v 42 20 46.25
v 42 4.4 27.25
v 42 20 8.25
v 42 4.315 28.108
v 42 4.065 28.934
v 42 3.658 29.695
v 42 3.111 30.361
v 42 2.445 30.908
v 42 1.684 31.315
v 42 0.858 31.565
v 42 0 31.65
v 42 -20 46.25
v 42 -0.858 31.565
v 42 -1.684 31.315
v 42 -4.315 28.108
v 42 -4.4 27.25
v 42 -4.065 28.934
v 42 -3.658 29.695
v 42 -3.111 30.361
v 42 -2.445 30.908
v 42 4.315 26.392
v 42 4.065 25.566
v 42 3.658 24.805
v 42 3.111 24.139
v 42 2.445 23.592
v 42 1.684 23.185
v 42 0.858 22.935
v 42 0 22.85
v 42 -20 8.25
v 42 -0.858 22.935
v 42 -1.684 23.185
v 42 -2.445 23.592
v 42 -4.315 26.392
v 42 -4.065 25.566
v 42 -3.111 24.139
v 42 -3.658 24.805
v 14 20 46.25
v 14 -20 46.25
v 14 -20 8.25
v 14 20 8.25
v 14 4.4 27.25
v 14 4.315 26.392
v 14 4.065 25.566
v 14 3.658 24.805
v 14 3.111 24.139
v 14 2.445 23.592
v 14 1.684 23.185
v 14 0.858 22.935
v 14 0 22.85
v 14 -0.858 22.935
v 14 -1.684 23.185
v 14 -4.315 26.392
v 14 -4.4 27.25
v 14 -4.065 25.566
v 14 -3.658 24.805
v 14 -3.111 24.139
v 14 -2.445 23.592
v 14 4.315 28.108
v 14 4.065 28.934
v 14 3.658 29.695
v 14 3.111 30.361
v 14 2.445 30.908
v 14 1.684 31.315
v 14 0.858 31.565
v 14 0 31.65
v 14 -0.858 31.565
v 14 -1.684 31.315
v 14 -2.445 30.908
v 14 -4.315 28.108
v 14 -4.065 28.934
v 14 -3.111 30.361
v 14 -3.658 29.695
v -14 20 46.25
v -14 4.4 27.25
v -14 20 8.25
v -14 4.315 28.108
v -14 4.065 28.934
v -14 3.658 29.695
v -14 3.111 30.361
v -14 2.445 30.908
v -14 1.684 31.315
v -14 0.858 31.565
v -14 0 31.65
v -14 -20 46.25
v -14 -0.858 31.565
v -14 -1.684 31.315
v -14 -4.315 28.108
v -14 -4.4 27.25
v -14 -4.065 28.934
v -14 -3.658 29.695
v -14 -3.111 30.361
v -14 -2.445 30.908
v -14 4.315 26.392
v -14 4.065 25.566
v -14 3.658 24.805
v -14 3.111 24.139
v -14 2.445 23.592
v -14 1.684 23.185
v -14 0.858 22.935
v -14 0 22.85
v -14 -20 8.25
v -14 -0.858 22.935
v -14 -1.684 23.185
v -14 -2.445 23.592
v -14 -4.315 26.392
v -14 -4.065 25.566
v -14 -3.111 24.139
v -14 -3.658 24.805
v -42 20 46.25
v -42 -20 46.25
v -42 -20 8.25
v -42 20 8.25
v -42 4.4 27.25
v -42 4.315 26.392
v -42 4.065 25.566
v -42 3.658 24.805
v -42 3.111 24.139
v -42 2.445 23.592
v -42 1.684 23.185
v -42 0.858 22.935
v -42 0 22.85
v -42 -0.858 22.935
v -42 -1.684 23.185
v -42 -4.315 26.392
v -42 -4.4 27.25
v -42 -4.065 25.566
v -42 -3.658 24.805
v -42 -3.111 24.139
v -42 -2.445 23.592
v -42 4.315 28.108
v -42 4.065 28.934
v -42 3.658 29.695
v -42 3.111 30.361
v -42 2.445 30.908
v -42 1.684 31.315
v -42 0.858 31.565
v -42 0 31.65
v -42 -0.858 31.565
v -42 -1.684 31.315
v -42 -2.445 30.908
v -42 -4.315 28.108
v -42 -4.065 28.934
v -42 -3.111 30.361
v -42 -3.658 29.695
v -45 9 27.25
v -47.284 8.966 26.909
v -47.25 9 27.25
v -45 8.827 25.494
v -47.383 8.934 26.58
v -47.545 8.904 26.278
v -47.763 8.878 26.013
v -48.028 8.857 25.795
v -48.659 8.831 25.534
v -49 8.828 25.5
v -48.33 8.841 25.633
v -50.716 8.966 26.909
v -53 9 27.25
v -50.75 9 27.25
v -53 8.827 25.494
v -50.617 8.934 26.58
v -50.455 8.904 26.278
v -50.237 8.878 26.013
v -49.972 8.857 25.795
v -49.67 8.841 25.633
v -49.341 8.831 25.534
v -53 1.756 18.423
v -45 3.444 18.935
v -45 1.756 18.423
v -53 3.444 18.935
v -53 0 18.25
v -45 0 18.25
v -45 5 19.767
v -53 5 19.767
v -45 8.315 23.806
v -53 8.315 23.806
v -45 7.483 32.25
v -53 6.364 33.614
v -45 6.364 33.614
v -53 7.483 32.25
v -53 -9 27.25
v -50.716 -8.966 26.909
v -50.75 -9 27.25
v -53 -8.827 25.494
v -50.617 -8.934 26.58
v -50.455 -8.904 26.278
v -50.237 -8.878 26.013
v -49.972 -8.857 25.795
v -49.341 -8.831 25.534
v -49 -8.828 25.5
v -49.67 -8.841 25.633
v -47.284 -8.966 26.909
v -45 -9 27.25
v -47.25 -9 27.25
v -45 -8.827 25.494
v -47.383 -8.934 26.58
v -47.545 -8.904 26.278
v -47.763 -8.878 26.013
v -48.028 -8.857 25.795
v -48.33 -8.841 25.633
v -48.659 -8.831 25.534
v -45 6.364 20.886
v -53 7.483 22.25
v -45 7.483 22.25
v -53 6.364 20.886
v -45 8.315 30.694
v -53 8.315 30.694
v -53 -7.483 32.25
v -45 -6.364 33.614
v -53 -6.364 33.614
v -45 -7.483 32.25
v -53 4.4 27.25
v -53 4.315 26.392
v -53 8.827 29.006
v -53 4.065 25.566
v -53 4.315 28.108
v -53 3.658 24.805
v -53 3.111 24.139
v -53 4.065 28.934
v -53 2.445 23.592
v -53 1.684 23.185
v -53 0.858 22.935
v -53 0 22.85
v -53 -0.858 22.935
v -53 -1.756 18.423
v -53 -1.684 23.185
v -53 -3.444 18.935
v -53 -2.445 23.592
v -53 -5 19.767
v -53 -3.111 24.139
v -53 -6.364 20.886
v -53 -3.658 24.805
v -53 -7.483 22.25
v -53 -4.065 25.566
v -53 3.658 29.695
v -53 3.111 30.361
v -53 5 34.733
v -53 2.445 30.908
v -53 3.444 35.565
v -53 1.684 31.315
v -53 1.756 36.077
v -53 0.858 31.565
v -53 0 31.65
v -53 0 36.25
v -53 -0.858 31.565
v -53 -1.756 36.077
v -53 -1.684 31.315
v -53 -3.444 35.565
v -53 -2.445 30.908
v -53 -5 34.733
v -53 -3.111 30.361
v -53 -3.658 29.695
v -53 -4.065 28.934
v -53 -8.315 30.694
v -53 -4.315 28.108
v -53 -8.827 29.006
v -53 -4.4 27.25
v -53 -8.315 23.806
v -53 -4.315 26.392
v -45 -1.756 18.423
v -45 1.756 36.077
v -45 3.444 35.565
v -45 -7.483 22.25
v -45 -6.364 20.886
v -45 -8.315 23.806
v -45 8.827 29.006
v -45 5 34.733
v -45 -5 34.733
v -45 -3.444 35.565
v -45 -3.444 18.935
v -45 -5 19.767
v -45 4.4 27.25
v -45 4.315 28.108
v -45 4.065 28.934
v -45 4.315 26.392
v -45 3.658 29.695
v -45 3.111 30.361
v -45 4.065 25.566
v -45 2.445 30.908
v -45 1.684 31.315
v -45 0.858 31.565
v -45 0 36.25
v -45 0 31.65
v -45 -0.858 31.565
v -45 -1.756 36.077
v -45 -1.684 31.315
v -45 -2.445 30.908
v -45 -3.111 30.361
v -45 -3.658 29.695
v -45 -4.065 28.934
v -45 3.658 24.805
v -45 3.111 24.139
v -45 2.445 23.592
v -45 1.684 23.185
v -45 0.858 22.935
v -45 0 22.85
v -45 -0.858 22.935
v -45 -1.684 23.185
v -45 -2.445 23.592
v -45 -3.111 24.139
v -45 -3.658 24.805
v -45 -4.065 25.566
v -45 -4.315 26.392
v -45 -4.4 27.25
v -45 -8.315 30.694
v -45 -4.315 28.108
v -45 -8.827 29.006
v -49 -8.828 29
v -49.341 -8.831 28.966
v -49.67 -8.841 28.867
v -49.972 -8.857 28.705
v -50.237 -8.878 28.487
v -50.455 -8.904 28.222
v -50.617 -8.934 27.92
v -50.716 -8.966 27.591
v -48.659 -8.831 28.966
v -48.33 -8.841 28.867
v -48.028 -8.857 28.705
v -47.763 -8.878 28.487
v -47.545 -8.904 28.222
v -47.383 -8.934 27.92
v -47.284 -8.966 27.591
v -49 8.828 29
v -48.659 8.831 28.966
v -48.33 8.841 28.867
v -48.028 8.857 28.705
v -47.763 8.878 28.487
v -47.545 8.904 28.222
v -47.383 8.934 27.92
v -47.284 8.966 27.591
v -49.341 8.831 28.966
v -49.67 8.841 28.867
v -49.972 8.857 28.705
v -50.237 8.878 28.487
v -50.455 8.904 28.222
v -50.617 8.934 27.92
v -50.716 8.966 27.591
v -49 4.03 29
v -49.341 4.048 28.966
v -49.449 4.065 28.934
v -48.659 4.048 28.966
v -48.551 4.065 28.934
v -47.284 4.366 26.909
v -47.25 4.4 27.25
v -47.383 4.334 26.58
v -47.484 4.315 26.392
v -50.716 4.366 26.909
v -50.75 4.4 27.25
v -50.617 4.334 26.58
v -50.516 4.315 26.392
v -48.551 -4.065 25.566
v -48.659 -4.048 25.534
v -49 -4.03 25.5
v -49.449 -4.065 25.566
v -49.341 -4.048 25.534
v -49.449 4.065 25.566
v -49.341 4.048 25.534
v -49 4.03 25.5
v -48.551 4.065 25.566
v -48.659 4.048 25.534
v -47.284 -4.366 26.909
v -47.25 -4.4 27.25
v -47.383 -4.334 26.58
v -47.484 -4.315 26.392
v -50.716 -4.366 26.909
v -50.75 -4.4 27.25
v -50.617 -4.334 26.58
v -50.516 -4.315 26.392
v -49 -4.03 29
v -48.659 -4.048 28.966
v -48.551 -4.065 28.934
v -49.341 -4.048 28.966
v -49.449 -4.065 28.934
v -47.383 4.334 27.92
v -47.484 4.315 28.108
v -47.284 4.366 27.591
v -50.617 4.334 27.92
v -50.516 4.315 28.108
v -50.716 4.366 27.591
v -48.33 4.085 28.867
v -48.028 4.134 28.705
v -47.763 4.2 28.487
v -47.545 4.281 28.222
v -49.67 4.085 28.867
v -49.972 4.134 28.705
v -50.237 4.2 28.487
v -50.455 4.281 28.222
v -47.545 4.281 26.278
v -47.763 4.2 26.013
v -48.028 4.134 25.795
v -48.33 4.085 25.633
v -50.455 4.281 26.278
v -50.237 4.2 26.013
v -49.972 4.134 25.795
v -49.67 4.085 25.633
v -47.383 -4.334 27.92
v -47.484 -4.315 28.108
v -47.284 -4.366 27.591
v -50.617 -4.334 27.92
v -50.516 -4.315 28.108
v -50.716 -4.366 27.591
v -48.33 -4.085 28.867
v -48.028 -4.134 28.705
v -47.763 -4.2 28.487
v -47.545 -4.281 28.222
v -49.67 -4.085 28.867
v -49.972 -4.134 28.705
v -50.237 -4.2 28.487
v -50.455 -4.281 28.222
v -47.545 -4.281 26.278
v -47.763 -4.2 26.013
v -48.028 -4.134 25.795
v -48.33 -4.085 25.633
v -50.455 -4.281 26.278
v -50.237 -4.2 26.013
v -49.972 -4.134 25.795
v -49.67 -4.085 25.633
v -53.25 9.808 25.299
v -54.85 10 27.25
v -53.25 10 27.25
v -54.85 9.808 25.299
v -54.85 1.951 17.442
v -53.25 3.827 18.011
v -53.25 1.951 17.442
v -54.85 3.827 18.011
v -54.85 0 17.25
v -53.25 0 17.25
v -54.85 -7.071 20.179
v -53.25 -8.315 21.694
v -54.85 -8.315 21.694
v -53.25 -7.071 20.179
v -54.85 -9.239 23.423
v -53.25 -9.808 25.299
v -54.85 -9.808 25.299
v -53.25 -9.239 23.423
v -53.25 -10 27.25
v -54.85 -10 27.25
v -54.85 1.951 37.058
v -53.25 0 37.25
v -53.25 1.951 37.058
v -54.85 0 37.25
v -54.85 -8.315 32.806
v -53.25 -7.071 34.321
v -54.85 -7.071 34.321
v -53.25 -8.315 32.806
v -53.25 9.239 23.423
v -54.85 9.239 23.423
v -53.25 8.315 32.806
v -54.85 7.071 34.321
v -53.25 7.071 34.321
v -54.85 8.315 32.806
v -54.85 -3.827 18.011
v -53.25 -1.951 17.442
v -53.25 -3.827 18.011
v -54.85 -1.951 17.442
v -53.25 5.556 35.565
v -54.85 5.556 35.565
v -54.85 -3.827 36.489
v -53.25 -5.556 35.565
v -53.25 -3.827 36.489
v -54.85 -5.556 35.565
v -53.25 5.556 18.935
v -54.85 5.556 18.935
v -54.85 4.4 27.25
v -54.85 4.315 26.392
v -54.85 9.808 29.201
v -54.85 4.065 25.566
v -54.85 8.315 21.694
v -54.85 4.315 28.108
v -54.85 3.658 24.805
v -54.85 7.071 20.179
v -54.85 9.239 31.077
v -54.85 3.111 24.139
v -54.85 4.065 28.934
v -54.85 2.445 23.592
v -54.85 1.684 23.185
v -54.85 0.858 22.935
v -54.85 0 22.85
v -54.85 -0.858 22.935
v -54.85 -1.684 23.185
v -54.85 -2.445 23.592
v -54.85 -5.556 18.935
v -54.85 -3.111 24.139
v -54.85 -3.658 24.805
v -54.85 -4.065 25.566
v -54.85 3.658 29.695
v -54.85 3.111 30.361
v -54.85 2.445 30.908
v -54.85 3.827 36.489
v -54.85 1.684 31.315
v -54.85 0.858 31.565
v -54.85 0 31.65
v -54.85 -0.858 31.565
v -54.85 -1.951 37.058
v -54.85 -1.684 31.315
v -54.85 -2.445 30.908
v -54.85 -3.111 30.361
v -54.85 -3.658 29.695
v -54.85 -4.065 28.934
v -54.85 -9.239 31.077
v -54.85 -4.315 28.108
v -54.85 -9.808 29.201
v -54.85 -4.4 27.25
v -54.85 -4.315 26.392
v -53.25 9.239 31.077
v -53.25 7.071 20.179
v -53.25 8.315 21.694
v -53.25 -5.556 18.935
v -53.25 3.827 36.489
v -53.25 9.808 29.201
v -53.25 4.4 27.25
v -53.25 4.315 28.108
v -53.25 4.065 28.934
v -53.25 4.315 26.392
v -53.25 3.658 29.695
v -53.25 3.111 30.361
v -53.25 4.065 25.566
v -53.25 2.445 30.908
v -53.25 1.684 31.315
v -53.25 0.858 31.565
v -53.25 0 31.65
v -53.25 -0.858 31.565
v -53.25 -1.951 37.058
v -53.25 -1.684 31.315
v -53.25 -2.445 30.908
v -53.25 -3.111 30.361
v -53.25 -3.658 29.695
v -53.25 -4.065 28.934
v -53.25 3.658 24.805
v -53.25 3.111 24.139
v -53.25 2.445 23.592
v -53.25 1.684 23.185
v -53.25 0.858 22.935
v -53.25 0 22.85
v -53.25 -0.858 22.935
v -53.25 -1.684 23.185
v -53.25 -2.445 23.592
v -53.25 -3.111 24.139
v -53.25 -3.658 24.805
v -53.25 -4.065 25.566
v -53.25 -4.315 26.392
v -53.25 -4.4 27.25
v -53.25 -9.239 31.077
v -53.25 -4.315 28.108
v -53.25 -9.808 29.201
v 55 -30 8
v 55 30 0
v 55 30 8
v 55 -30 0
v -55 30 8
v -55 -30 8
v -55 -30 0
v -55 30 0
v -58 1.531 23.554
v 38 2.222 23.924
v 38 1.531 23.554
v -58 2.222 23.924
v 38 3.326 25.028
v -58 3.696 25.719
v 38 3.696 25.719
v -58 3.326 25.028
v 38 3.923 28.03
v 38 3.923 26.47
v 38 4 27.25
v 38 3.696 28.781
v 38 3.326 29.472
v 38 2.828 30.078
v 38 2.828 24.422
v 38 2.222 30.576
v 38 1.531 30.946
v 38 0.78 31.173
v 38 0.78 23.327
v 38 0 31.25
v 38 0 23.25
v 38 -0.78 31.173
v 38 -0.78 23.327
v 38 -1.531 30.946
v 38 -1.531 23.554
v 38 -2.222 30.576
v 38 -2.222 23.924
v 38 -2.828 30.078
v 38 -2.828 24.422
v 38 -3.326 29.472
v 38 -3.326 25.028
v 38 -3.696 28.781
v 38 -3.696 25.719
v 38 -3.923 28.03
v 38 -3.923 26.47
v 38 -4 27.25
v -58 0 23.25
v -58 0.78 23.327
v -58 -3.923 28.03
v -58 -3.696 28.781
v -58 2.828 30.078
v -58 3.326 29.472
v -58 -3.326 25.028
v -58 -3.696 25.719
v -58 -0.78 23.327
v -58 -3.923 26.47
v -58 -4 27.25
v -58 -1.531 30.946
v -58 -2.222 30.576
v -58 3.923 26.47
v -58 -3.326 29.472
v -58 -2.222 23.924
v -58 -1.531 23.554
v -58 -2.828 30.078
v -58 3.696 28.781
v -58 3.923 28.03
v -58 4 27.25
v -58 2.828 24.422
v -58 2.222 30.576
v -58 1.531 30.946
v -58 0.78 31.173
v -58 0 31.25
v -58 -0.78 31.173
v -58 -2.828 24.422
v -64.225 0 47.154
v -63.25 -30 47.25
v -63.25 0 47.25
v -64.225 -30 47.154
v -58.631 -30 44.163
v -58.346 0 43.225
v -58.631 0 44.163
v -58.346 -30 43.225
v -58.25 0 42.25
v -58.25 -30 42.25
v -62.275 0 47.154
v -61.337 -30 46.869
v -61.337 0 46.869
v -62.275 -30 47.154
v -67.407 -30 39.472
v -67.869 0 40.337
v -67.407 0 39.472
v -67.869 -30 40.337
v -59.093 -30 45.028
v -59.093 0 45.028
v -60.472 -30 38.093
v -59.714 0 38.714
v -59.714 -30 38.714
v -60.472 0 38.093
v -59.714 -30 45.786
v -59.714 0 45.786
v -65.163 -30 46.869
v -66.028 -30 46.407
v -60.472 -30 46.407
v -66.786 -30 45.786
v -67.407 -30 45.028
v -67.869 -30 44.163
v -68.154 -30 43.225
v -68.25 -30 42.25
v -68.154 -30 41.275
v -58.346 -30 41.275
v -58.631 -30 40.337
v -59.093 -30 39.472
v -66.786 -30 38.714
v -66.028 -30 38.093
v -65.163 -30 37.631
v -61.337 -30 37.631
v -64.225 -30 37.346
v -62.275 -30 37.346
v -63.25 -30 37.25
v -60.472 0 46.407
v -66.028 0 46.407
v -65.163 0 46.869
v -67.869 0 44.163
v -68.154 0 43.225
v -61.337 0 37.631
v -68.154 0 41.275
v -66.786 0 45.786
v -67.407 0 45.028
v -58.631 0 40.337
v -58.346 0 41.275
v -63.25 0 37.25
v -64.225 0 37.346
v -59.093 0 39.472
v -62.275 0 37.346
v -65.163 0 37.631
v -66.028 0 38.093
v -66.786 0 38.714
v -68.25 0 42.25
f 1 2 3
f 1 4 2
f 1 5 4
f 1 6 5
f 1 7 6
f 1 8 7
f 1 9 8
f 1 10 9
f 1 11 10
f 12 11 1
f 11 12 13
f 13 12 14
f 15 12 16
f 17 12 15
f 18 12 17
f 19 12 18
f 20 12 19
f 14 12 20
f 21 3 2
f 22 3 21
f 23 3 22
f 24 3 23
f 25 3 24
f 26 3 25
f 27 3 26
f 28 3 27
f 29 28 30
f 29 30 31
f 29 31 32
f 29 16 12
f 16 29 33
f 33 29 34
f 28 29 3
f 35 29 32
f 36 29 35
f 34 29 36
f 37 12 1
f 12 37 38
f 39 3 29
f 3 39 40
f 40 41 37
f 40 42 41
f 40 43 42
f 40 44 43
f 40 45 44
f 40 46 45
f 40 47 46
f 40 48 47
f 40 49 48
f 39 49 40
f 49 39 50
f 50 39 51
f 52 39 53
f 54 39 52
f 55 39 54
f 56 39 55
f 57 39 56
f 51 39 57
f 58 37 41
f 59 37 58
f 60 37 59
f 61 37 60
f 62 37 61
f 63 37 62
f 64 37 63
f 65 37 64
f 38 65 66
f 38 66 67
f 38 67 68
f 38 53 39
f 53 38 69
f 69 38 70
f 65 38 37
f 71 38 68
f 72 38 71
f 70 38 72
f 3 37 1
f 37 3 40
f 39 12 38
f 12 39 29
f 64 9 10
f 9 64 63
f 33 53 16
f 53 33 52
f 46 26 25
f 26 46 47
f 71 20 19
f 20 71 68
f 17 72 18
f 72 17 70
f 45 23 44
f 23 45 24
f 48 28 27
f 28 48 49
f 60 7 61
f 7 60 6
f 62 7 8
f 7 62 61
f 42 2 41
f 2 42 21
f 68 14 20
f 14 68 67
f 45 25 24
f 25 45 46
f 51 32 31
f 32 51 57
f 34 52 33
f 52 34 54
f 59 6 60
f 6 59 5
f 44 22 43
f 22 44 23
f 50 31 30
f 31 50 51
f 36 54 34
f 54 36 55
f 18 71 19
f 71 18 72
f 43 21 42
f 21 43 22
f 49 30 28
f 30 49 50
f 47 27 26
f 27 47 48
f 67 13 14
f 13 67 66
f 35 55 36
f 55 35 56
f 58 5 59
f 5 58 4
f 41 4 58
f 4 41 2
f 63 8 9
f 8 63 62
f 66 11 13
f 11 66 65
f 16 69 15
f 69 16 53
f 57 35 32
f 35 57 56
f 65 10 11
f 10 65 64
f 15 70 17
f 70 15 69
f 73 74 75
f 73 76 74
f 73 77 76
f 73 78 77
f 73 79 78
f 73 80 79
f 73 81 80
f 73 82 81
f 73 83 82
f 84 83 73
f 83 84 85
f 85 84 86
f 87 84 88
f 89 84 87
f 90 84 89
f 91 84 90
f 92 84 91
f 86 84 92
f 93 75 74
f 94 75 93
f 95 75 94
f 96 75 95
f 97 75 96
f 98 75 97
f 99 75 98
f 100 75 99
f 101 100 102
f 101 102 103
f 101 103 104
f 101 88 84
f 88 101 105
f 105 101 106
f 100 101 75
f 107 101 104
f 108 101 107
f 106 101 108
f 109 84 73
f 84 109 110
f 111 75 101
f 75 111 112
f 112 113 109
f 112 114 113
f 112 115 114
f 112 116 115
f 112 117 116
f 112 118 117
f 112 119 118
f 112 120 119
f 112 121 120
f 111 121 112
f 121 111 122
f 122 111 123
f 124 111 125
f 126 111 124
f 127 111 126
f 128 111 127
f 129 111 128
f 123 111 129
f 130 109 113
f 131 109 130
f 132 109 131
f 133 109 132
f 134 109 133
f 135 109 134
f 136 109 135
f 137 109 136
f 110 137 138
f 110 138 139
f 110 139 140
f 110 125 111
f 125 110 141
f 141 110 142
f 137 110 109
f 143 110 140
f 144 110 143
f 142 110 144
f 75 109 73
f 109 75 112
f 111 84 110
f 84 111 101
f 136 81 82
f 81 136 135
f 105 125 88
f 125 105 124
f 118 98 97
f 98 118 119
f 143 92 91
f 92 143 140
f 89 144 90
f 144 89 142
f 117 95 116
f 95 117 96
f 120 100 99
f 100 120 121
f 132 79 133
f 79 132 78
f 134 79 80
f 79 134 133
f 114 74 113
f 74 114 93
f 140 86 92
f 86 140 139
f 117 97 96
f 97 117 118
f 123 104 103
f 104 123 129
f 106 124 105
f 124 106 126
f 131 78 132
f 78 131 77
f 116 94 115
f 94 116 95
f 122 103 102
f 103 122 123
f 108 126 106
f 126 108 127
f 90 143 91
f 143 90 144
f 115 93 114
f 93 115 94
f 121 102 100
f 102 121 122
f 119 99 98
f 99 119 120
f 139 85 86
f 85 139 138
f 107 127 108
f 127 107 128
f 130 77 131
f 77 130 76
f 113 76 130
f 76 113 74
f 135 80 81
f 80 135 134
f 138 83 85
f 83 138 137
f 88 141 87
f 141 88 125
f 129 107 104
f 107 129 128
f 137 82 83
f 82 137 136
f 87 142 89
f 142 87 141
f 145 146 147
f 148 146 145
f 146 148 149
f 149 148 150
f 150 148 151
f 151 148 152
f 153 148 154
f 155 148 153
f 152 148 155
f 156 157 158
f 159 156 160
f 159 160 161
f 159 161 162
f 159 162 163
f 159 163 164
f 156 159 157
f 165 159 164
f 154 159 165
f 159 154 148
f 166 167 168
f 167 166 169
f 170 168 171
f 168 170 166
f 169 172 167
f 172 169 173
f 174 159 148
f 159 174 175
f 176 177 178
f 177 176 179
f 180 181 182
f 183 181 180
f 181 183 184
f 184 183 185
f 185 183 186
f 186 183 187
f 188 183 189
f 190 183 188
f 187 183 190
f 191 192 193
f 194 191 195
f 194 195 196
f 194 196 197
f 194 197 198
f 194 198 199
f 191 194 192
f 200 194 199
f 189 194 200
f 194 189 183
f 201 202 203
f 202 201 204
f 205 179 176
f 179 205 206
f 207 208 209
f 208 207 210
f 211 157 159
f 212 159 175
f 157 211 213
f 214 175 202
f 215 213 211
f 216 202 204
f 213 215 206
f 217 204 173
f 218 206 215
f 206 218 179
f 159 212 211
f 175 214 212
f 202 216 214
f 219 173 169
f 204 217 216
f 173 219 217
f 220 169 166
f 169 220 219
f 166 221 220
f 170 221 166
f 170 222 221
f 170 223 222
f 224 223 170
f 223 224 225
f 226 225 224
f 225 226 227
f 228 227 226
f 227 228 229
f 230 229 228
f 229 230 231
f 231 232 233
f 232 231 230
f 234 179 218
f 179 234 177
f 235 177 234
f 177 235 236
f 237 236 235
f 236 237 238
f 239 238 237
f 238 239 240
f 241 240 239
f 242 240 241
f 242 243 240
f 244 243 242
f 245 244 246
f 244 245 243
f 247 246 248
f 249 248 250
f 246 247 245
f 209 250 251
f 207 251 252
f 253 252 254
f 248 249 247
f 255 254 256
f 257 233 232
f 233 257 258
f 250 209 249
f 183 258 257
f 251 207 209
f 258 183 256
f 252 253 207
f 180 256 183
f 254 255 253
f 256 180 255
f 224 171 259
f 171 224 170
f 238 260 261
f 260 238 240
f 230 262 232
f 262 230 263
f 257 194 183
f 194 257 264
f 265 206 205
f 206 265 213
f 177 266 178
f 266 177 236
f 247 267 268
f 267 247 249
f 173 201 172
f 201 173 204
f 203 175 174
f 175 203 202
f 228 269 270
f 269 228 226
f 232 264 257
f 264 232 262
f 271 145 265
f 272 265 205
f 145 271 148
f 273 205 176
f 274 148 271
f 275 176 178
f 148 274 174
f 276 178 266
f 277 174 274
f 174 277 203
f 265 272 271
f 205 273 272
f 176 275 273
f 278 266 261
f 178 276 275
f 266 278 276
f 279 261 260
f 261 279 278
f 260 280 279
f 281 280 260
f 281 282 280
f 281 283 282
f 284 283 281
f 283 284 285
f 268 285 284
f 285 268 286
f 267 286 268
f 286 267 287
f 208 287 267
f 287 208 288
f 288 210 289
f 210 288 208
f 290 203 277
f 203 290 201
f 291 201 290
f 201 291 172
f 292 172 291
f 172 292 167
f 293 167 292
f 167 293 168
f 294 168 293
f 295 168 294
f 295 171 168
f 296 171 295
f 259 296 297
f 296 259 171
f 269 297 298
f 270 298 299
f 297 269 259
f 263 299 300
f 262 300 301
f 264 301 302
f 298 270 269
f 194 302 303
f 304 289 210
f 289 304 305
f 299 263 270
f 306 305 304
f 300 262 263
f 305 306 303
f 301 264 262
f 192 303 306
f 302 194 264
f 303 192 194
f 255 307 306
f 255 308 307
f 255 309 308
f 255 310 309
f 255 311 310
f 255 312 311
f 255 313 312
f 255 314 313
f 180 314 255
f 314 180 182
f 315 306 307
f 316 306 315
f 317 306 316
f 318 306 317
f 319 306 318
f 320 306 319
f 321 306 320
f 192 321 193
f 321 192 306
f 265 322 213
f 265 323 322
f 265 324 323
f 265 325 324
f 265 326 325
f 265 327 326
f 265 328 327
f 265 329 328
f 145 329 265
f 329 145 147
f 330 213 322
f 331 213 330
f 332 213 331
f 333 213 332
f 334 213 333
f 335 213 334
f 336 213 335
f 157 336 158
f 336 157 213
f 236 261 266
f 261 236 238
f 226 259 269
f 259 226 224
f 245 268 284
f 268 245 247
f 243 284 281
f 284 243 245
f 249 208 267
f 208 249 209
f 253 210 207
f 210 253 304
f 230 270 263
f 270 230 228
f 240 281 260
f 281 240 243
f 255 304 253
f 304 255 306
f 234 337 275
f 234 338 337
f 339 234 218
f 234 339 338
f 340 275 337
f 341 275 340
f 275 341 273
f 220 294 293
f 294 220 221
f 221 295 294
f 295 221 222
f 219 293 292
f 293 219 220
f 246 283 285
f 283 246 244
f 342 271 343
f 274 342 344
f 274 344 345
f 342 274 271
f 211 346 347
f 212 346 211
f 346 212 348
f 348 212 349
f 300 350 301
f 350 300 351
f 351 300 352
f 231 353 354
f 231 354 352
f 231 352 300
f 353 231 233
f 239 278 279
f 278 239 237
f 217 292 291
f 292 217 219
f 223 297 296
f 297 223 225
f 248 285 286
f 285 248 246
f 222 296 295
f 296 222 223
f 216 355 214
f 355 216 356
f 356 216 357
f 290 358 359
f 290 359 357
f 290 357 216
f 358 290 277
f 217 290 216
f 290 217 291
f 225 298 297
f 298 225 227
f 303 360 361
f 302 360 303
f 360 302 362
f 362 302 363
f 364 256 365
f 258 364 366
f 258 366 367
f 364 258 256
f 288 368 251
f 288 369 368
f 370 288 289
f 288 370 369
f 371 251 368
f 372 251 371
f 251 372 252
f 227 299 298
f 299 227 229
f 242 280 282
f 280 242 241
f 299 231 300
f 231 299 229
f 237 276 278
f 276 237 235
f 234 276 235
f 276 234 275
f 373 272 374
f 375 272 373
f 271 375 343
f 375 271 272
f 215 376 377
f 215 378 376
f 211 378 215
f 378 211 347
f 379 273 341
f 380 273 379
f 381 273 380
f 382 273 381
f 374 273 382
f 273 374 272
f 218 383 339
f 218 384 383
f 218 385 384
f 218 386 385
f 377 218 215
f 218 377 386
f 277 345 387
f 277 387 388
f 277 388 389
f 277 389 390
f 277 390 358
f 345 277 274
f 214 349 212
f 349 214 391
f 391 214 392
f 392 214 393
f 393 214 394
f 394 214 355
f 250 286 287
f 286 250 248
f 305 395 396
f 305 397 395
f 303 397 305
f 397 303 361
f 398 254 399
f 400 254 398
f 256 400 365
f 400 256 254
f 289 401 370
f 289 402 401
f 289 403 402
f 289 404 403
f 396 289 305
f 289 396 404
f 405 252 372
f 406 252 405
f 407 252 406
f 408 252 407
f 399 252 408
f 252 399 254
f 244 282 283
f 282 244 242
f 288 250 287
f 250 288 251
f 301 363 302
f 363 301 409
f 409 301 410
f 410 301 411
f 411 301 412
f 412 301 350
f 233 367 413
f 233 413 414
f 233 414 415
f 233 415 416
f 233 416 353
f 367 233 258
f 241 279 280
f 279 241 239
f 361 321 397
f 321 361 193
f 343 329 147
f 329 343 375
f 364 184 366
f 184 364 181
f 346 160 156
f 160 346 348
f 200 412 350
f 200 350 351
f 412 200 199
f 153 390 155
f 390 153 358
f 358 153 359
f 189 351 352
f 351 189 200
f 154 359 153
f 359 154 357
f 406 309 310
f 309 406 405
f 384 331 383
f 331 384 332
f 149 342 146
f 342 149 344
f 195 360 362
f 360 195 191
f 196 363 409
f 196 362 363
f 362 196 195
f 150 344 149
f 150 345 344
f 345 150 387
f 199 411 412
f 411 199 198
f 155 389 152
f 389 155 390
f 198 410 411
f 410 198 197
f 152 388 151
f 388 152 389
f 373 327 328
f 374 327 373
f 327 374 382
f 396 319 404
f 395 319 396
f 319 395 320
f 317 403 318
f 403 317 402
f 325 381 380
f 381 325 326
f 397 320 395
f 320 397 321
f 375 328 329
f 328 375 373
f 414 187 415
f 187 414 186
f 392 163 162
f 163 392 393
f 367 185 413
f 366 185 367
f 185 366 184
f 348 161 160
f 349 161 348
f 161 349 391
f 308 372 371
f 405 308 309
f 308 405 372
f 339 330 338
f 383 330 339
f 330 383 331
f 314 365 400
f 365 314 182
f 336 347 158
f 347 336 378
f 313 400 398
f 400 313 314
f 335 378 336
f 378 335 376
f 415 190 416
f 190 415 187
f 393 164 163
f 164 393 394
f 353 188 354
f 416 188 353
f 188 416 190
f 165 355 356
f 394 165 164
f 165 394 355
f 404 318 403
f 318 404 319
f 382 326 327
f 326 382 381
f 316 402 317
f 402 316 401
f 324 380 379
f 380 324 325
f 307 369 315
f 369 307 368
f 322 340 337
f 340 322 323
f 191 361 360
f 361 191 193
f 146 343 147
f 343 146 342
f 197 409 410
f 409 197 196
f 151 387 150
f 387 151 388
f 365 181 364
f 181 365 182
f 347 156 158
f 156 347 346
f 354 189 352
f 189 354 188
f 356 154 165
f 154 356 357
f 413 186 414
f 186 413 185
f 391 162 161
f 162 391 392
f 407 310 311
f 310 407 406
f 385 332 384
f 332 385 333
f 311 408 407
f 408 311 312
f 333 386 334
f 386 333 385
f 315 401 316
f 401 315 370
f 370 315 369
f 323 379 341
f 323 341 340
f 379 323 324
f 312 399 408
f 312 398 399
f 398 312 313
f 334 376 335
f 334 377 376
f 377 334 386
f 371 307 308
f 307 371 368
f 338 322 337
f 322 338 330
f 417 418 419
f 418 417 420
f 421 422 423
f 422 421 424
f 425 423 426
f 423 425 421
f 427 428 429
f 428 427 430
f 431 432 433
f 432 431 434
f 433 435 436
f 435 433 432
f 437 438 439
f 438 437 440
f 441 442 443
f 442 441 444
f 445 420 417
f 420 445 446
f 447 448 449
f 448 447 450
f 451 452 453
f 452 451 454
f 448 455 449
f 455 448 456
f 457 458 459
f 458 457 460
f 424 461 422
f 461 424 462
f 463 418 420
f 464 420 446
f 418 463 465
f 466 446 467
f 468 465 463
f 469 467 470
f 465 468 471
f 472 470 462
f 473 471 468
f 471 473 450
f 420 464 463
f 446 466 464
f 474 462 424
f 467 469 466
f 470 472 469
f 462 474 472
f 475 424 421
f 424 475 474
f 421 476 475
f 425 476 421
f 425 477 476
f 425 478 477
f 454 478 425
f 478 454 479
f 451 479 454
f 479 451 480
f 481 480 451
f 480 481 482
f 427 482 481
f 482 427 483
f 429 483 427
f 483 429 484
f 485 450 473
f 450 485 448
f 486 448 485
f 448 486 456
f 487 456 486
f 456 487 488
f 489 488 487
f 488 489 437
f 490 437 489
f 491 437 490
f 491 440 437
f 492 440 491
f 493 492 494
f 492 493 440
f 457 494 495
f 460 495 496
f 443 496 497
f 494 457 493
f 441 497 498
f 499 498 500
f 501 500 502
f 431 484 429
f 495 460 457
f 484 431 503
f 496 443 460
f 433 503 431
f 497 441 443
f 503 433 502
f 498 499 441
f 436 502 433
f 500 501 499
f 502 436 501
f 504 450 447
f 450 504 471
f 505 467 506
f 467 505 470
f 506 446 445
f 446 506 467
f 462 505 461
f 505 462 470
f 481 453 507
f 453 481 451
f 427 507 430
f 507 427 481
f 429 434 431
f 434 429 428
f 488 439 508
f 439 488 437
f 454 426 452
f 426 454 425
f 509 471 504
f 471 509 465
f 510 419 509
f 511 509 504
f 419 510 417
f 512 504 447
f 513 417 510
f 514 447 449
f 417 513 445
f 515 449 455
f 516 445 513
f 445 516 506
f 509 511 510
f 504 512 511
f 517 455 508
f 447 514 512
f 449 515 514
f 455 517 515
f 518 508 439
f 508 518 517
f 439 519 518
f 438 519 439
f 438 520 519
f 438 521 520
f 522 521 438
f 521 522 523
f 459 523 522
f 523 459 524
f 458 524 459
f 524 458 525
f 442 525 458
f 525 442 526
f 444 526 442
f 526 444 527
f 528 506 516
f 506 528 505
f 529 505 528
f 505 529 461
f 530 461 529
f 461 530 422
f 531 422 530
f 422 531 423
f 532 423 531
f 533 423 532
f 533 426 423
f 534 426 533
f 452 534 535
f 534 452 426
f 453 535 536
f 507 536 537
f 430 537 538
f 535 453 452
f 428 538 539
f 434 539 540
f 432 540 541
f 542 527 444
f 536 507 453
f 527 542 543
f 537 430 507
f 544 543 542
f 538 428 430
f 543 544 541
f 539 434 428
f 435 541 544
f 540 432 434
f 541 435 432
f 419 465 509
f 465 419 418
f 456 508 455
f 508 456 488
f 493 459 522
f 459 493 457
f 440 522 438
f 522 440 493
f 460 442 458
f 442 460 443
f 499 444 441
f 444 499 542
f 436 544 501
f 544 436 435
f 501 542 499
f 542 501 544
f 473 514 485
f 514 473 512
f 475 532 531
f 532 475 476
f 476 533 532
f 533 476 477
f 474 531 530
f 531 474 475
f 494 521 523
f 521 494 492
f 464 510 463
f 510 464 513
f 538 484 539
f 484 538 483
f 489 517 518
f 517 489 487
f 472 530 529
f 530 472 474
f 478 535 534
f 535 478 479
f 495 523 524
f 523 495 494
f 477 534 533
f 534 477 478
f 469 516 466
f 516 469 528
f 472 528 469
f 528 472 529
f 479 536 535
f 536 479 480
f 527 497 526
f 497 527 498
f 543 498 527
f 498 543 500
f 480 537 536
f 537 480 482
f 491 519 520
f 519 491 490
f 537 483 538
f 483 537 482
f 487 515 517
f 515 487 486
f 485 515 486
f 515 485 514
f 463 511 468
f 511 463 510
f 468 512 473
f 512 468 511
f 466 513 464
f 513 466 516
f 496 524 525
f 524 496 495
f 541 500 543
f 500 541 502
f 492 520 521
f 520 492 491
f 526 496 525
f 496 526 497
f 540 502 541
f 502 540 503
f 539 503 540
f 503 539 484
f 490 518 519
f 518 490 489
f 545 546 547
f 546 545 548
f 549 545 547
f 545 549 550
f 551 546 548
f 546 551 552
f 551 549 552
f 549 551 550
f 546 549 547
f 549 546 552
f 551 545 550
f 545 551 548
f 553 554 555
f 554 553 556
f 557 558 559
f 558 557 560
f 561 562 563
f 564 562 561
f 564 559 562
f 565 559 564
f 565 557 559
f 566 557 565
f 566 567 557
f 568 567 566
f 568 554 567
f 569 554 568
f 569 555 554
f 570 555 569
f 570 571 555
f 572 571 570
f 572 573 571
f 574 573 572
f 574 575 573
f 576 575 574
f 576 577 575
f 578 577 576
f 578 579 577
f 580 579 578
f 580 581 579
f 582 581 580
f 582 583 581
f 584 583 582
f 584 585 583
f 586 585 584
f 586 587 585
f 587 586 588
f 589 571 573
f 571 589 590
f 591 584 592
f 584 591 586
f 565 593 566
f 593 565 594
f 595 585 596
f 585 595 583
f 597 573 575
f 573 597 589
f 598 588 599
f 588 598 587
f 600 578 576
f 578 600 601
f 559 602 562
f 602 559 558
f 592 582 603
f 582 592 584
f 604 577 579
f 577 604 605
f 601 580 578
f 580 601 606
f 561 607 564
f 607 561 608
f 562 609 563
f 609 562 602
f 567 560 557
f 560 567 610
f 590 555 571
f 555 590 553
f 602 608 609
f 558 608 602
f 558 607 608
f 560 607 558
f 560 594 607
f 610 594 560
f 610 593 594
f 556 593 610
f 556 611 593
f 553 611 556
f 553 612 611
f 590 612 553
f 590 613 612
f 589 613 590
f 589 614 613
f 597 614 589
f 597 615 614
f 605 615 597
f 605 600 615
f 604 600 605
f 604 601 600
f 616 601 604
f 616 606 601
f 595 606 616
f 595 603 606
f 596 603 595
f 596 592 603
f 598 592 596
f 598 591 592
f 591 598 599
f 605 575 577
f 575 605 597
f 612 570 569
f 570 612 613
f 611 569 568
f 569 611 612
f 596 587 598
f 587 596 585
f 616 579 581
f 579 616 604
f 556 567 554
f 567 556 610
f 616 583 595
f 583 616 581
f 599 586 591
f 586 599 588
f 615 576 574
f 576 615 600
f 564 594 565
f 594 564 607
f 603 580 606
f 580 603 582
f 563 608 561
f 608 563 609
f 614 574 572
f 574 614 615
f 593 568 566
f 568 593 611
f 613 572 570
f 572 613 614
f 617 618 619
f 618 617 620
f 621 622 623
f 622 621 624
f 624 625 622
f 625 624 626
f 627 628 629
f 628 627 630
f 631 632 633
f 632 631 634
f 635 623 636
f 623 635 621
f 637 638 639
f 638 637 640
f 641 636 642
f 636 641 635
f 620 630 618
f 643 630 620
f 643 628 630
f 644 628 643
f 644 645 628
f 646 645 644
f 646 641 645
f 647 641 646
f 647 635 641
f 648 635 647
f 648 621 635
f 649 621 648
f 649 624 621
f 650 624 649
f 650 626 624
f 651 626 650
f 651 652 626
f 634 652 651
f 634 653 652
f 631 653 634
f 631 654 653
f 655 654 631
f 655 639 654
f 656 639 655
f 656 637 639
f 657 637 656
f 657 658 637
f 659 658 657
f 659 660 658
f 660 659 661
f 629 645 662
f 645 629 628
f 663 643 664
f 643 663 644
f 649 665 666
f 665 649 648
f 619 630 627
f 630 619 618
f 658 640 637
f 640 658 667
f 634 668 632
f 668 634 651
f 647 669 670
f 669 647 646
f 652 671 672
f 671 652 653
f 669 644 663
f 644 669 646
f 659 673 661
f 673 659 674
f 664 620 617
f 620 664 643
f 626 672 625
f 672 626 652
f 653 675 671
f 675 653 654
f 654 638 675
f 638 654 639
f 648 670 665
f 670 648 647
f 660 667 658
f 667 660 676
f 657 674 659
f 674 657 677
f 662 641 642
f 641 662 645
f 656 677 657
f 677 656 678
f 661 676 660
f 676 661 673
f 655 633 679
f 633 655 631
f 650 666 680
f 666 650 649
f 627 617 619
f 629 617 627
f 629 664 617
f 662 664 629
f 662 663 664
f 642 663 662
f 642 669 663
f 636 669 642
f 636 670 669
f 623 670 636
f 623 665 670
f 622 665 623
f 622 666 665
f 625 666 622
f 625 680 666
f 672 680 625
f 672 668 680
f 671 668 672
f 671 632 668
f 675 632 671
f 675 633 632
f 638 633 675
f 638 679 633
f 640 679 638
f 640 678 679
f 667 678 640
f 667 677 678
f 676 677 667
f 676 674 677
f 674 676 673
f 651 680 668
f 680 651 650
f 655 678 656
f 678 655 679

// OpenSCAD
$fn = 32;

// ------------------------------------------------------------------------
// Machine vise: screw d8, jaws 28 x 38 mm
// Every part is its own module, assembly() places every instance.
// ------------------------------------------------------------------------

// --- part 1 ---
module vise_bed() {
  difference() {
    translate([-55, -30, 0]) cube([110, 60, 8]);
  }
}

// --- part 2 ---
module vise_jaw() {
  difference() {
    translate([-14, -20, 0]) cube([28, 40, 38]);
    translate([0, 0, 19]) rotate([0, 90, 0]) cylinder(h = 30, d = 8.8, center = true);
  }
}

// --- part 3 ---
module vise_screw() {
  translate([0, 0, -48]) cylinder(h = 96, d = 8);
}

// --- part 4 ---
module screw_collar() {
  difference() {
    cylinder(h = 8, d = 18);
    translate([0, 0, -1]) cylinder(h = 10, d = 8.8);
    translate([0, 0, 4]) rotate([90, 0, 0]) cylinder(h = 20, d = 3.5, center = true);
  }
}

// --- part 5 ---
module screw_washer() {
  difference() {
      translate([0, 0, 0]) cylinder(h = 1.6, d = 20);
      translate([0, 0, -1]) cylinder(h = 3.6, d = 8.8);
    }
}

// --- part 6 ---
module vise_handle() {
  cylinder(h = 30, d = 10);
}

// --- assembly ---
module assembly() {
  color([0.80, 0.24, 0.20]) translate([0, 0, 0]) rotate([0, 0, 0]) vise_bed();
  color([0.20, 0.45, 0.75]) translate([28, 0, 8.25]) rotate([0, 0, 0]) vise_jaw();
  color([0.25, 0.62, 0.32]) translate([-28, 0, 8.25]) rotate([0, 0, 0]) vise_jaw();
  color([0.92, 0.70, 0.18]) translate([-10, 0, 27.25]) rotate([0, 90, 0]) vise_screw();
  color([0.58, 0.35, 0.70]) translate([-53, 0, 27.25]) rotate([0, 90, 0]) screw_collar();
  color([0.16, 0.66, 0.66]) translate([-54.85, 0, 27.25]) rotate([0, 90, 0]) screw_washer();
  color([0.85, 0.48, 0.18]) translate([-63.25, 0, 42.25]) rotate([90, 0, 0]) vise_handle();
}

assembly();
